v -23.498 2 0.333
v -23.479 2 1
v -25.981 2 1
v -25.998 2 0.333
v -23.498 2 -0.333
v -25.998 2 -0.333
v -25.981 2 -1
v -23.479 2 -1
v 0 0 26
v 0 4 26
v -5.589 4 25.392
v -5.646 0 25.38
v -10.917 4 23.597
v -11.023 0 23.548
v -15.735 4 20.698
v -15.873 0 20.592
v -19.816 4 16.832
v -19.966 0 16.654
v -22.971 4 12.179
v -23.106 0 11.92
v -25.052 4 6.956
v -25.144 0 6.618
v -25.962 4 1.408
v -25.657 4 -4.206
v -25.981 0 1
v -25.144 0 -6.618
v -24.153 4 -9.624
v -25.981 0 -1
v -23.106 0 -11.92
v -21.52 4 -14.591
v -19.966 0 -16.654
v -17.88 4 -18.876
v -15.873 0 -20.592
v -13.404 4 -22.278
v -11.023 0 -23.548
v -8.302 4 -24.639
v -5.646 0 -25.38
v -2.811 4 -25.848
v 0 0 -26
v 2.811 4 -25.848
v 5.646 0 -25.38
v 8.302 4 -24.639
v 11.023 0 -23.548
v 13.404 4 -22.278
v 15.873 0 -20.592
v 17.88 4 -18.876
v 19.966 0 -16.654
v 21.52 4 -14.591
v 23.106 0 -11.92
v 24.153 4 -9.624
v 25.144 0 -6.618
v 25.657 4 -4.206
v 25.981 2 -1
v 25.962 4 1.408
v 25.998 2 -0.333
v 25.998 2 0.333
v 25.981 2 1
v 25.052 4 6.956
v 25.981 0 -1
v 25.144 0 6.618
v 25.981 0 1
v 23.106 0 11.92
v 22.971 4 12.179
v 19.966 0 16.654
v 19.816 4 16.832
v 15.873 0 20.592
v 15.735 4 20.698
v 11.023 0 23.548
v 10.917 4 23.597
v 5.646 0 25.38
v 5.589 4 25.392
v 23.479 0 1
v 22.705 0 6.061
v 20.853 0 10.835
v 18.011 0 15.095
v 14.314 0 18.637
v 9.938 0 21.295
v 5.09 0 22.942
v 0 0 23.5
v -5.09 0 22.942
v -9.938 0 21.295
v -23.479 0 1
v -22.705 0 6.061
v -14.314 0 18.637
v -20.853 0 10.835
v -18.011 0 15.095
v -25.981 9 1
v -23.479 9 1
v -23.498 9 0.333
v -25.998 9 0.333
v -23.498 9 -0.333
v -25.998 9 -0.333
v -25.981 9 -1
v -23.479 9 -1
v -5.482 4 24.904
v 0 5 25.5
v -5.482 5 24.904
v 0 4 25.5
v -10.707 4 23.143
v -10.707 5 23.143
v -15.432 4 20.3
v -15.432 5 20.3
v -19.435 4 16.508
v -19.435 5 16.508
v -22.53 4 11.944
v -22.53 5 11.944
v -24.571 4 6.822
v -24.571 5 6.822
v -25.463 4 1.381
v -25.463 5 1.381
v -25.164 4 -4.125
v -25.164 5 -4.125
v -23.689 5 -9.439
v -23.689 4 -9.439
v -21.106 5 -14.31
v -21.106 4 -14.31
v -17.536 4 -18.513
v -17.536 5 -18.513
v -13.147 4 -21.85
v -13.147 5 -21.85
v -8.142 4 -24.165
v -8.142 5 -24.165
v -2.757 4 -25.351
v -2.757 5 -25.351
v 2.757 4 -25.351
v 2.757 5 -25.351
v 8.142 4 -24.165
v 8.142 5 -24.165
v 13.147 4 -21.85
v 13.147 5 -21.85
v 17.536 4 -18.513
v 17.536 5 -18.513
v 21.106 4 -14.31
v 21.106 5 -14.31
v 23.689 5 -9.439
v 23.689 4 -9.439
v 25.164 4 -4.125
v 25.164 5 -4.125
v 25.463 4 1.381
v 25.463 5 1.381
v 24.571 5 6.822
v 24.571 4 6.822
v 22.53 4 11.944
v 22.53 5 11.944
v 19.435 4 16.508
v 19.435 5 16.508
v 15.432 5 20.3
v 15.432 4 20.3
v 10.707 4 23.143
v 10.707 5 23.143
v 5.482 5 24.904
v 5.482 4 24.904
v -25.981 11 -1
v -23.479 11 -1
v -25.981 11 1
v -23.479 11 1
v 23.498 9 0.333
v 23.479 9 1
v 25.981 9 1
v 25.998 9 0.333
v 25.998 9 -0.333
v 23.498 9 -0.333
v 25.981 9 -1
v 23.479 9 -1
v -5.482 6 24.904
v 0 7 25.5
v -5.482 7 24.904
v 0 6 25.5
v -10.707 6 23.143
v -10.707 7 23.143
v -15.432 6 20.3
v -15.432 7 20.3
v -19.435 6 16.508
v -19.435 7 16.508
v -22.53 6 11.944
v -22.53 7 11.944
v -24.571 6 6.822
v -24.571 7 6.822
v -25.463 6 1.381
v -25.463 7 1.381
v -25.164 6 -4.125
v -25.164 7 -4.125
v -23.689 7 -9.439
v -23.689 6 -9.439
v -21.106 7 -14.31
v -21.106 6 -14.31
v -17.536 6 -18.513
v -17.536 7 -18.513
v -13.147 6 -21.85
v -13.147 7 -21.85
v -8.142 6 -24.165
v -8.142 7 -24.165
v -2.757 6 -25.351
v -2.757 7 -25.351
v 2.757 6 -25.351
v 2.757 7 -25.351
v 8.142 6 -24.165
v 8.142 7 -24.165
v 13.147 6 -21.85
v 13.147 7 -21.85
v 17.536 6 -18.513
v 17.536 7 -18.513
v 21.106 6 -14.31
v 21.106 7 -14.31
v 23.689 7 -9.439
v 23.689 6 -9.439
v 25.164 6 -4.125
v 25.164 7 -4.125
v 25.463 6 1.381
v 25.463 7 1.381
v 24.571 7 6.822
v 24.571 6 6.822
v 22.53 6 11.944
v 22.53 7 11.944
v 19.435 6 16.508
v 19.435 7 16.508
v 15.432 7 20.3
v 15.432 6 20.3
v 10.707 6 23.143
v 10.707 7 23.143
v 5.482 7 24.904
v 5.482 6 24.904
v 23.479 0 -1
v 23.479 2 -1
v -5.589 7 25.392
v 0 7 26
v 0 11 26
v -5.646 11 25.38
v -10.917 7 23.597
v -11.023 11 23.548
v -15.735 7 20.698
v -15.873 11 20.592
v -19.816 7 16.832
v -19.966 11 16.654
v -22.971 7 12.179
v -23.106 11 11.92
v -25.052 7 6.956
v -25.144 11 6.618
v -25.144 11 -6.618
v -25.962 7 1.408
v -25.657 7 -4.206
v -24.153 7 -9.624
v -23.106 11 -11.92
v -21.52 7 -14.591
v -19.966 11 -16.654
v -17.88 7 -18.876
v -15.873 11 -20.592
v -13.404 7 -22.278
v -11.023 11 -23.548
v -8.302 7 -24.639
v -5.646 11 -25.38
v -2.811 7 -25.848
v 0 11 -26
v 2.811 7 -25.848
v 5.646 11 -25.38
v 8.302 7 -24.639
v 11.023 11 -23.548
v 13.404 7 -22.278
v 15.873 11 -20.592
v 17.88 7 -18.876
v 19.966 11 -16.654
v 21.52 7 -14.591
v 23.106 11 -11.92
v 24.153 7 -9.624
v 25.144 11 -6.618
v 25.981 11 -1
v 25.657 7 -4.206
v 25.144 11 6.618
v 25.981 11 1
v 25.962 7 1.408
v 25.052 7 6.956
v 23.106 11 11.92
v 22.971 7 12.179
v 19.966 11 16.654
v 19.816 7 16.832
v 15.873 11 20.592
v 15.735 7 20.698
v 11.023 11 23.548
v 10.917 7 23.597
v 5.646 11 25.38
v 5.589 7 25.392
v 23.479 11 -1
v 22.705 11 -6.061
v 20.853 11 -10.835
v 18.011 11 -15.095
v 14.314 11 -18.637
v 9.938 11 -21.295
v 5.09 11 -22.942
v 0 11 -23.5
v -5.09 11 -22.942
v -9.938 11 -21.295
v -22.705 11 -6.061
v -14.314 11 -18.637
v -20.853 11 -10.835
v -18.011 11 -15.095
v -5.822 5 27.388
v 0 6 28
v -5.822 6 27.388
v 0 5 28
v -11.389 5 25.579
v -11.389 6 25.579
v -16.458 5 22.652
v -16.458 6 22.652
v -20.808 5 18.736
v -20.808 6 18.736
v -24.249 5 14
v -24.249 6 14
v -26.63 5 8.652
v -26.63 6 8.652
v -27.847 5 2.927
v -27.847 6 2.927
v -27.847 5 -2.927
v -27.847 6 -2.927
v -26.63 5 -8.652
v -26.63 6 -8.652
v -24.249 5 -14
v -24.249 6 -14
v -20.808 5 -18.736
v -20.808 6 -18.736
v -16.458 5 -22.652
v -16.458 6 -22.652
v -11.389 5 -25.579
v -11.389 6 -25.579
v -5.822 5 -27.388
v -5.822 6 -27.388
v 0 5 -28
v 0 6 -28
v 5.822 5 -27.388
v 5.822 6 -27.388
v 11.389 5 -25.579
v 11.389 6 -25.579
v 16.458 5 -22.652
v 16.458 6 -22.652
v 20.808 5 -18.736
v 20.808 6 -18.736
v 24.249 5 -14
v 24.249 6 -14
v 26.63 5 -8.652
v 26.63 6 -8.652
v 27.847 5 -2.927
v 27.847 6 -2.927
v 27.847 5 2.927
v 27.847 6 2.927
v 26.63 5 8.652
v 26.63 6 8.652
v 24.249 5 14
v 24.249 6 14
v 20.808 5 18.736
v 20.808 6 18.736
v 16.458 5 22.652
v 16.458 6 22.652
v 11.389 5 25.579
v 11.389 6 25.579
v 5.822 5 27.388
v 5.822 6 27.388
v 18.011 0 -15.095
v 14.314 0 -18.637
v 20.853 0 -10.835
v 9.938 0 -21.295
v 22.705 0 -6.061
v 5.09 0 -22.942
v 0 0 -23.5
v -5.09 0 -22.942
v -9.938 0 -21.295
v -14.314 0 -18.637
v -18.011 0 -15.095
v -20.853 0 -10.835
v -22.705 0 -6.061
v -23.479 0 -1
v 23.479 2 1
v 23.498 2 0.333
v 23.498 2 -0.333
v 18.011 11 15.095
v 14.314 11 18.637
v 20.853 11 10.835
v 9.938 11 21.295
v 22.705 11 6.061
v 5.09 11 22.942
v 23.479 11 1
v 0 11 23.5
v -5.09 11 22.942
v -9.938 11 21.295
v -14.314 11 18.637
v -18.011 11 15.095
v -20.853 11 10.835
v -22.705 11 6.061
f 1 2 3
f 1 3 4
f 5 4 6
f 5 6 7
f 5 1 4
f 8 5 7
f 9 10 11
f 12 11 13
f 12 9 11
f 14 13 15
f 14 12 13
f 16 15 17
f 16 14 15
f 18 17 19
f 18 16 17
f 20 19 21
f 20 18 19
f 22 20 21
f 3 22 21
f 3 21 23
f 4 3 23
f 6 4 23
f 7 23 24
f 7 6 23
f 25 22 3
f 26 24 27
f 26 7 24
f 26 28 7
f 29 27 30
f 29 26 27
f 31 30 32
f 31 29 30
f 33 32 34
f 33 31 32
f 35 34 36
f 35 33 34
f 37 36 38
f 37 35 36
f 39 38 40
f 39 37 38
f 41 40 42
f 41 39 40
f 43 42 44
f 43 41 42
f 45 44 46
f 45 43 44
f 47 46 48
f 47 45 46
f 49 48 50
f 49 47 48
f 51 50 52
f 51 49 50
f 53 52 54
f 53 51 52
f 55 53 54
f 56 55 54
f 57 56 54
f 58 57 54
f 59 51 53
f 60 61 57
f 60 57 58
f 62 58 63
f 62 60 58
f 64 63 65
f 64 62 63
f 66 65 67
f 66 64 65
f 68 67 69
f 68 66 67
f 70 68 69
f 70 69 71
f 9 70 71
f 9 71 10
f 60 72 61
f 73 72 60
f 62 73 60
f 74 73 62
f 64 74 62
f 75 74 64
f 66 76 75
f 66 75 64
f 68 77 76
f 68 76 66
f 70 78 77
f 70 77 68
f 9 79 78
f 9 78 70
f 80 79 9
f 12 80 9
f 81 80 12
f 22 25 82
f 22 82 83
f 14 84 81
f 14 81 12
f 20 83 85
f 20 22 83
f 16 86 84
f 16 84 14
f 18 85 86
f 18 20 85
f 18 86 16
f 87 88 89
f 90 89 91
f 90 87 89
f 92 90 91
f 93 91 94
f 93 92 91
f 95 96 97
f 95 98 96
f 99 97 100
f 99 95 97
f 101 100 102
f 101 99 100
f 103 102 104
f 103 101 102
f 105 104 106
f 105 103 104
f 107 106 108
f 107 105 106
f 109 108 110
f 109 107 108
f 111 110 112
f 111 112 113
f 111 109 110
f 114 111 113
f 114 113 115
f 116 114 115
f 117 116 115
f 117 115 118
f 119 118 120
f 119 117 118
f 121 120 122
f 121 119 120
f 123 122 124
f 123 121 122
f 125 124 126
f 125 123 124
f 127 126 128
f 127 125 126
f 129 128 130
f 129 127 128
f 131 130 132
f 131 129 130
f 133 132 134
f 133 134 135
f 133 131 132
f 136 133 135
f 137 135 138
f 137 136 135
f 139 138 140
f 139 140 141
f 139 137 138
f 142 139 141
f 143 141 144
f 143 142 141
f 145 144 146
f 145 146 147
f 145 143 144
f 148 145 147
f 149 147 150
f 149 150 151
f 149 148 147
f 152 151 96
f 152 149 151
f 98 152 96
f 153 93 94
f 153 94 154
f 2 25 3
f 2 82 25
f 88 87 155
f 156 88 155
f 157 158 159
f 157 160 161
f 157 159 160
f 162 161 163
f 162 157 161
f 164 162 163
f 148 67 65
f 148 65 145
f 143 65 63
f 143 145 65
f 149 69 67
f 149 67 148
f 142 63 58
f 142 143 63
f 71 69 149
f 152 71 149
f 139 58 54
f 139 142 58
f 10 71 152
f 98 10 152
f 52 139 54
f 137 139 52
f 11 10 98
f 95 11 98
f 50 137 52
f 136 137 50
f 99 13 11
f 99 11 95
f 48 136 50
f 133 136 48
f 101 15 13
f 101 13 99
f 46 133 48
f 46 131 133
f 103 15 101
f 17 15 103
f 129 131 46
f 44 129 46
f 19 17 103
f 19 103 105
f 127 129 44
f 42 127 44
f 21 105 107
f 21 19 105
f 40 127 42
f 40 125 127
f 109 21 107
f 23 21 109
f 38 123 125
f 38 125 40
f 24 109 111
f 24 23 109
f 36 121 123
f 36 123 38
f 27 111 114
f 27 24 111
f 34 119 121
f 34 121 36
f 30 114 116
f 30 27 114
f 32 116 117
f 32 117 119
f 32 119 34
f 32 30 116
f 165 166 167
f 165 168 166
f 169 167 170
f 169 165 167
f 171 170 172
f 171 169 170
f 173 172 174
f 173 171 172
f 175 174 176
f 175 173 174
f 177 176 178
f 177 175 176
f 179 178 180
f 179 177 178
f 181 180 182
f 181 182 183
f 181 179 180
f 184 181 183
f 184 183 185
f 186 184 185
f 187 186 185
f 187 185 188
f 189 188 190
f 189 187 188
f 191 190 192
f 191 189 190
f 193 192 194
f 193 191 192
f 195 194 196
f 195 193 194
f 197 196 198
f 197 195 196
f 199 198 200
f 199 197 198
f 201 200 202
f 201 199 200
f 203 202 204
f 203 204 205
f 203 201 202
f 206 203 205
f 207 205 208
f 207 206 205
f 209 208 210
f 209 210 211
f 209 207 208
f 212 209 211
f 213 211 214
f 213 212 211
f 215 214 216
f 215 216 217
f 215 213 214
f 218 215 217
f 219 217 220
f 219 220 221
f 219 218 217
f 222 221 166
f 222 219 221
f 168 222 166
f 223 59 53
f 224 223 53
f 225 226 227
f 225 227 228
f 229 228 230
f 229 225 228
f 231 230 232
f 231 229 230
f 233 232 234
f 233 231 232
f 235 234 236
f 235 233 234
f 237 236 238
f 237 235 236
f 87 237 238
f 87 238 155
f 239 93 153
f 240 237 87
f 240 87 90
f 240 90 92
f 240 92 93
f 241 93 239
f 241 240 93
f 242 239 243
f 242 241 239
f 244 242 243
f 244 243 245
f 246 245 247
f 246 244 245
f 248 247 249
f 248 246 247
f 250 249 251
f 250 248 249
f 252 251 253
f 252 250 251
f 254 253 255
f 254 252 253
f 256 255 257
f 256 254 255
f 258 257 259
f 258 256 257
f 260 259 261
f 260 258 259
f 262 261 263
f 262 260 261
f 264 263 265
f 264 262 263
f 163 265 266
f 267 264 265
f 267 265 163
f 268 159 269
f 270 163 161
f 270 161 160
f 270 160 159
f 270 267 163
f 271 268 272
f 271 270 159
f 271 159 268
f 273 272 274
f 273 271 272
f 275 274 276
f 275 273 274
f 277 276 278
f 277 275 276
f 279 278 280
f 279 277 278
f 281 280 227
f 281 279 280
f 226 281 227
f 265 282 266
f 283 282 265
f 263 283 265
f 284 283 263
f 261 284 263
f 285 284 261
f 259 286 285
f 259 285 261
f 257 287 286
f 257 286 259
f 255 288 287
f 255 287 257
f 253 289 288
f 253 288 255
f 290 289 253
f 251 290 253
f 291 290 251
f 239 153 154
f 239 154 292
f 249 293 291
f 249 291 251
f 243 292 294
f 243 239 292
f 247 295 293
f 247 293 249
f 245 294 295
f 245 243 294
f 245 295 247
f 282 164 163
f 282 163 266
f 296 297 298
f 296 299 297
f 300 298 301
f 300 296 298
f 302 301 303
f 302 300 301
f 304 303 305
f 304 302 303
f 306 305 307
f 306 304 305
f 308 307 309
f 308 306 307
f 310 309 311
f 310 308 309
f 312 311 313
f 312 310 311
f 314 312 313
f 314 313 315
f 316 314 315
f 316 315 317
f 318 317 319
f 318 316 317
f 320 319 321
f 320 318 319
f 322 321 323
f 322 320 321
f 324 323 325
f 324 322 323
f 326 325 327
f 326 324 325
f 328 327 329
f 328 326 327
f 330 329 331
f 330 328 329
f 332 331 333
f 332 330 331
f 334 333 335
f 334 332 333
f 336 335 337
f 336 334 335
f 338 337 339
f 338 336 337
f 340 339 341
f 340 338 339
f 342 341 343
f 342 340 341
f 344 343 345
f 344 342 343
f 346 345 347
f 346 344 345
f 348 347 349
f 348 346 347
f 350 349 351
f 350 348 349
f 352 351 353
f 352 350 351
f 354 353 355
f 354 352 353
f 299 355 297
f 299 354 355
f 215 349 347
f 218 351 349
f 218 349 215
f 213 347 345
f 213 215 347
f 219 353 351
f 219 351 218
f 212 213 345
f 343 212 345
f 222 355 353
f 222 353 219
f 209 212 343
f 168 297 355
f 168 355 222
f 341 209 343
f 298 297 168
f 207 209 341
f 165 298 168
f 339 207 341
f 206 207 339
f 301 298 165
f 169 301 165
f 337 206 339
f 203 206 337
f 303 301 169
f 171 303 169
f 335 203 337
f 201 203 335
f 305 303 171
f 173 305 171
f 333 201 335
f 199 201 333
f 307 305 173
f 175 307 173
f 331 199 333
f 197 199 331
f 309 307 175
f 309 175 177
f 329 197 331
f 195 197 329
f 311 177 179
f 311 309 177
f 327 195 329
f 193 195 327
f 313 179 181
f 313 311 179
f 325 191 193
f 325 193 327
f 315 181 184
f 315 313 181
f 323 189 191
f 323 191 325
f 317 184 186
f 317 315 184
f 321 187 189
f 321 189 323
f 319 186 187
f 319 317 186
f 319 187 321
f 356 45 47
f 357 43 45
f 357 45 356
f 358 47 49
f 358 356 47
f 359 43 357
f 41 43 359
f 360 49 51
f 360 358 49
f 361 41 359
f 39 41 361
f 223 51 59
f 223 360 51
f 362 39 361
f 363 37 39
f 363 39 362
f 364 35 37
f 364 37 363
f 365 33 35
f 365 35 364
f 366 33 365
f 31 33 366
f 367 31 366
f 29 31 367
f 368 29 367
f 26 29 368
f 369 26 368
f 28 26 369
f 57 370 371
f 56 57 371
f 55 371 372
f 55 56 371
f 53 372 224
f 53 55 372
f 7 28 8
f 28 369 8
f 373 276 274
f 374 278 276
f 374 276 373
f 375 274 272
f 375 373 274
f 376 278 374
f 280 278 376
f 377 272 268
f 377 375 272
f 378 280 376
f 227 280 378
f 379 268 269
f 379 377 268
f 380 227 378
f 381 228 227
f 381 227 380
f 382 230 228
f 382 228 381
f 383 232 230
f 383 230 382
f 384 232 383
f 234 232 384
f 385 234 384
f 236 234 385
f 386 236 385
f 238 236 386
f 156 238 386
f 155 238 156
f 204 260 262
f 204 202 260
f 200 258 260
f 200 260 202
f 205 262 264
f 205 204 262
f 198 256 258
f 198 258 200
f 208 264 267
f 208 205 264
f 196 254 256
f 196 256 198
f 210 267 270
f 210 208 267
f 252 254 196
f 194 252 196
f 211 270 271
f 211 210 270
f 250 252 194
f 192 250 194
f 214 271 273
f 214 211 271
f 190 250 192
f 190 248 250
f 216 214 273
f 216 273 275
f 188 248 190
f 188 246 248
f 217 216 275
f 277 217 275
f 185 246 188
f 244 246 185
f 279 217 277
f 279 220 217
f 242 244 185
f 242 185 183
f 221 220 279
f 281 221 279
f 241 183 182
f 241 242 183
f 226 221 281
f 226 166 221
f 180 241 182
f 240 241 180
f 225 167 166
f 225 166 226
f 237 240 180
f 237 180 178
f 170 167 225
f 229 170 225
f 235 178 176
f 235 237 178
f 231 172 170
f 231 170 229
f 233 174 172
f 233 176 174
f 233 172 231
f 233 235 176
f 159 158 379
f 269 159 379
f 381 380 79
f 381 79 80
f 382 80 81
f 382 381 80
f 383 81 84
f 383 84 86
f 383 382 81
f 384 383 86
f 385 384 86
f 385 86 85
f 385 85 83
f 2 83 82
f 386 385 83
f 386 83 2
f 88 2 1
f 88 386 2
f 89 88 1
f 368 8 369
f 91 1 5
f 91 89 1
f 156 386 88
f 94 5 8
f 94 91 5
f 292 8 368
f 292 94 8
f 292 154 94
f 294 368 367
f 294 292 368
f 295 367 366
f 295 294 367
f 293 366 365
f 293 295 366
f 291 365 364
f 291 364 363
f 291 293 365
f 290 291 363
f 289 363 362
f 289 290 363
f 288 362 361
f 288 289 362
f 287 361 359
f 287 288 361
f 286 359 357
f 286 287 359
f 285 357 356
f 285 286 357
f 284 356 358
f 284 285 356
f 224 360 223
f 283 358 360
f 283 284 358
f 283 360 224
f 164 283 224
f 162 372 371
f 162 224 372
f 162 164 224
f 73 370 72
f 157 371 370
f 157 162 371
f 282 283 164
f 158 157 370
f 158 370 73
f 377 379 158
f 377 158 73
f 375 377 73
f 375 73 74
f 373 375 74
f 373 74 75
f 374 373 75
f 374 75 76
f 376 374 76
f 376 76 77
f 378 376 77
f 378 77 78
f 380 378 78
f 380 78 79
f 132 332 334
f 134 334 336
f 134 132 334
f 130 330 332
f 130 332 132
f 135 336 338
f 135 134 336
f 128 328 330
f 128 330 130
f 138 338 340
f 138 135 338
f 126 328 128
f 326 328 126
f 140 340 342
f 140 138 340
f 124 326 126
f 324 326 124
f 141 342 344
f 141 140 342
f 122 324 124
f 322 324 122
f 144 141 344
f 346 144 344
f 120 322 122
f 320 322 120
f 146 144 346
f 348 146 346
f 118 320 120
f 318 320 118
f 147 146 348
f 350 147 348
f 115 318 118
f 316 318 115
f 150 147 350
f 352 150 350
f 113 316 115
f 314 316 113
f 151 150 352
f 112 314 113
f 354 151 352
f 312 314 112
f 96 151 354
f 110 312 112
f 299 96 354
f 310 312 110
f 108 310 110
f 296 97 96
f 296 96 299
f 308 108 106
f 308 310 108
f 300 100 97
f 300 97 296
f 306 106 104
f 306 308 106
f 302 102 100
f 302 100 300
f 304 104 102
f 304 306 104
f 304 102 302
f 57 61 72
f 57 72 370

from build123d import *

# Parameters (mm, degrees)
SKETCH_2_W          = 2
SKETCH_2_H          = 4.593987872
SKETCH_2_H_2        = 6.667892238
CUT_EXTRUDE_1_DEPTH = 39.5


with BuildPart() as part:
    # 草图1 → 旋转1 (revolve)
    with BuildSketch(Plane.XY, mode=Mode.PRIVATE) as revolve_1_sk:
        Polygon((-23.5, 11), (-26, 11), (-26, 7), (-25.5, 7), (-25.5, 6), (-28, 6), (-28, 5), (-25.5, 5), (-25.5, 4), (-26, 4), (-26, 0), (-23.5, 0), align=None)
    revolve(revolve_1_sk.sketch.rotate(Axis((0, 22.677499451, 0), (0, -1, 0)), 270), axis=Axis((0, 22.677499451, 0), (0, -1, 0)))  # turned: the seam where the file's is

    # 草图2 → 切除-拉伸1 (cut, symmetric)
    with BuildSketch(Plane(origin=(0, 0, 0), x_dir=(0, 0, -1), z_dir=(1, 0, 0))):
        with Locations((0, 11.296993936)):
            Rectangle(SKETCH_2_W, SKETCH_2_H)
        with Locations((0, -1.333946119)):
            Rectangle(SKETCH_2_W, SKETCH_2_H_2)
    extrude(amount=CUT_EXTRUDE_1_DEPTH, both=True, mode=Mode.SUBTRACT)


solid = part.part
